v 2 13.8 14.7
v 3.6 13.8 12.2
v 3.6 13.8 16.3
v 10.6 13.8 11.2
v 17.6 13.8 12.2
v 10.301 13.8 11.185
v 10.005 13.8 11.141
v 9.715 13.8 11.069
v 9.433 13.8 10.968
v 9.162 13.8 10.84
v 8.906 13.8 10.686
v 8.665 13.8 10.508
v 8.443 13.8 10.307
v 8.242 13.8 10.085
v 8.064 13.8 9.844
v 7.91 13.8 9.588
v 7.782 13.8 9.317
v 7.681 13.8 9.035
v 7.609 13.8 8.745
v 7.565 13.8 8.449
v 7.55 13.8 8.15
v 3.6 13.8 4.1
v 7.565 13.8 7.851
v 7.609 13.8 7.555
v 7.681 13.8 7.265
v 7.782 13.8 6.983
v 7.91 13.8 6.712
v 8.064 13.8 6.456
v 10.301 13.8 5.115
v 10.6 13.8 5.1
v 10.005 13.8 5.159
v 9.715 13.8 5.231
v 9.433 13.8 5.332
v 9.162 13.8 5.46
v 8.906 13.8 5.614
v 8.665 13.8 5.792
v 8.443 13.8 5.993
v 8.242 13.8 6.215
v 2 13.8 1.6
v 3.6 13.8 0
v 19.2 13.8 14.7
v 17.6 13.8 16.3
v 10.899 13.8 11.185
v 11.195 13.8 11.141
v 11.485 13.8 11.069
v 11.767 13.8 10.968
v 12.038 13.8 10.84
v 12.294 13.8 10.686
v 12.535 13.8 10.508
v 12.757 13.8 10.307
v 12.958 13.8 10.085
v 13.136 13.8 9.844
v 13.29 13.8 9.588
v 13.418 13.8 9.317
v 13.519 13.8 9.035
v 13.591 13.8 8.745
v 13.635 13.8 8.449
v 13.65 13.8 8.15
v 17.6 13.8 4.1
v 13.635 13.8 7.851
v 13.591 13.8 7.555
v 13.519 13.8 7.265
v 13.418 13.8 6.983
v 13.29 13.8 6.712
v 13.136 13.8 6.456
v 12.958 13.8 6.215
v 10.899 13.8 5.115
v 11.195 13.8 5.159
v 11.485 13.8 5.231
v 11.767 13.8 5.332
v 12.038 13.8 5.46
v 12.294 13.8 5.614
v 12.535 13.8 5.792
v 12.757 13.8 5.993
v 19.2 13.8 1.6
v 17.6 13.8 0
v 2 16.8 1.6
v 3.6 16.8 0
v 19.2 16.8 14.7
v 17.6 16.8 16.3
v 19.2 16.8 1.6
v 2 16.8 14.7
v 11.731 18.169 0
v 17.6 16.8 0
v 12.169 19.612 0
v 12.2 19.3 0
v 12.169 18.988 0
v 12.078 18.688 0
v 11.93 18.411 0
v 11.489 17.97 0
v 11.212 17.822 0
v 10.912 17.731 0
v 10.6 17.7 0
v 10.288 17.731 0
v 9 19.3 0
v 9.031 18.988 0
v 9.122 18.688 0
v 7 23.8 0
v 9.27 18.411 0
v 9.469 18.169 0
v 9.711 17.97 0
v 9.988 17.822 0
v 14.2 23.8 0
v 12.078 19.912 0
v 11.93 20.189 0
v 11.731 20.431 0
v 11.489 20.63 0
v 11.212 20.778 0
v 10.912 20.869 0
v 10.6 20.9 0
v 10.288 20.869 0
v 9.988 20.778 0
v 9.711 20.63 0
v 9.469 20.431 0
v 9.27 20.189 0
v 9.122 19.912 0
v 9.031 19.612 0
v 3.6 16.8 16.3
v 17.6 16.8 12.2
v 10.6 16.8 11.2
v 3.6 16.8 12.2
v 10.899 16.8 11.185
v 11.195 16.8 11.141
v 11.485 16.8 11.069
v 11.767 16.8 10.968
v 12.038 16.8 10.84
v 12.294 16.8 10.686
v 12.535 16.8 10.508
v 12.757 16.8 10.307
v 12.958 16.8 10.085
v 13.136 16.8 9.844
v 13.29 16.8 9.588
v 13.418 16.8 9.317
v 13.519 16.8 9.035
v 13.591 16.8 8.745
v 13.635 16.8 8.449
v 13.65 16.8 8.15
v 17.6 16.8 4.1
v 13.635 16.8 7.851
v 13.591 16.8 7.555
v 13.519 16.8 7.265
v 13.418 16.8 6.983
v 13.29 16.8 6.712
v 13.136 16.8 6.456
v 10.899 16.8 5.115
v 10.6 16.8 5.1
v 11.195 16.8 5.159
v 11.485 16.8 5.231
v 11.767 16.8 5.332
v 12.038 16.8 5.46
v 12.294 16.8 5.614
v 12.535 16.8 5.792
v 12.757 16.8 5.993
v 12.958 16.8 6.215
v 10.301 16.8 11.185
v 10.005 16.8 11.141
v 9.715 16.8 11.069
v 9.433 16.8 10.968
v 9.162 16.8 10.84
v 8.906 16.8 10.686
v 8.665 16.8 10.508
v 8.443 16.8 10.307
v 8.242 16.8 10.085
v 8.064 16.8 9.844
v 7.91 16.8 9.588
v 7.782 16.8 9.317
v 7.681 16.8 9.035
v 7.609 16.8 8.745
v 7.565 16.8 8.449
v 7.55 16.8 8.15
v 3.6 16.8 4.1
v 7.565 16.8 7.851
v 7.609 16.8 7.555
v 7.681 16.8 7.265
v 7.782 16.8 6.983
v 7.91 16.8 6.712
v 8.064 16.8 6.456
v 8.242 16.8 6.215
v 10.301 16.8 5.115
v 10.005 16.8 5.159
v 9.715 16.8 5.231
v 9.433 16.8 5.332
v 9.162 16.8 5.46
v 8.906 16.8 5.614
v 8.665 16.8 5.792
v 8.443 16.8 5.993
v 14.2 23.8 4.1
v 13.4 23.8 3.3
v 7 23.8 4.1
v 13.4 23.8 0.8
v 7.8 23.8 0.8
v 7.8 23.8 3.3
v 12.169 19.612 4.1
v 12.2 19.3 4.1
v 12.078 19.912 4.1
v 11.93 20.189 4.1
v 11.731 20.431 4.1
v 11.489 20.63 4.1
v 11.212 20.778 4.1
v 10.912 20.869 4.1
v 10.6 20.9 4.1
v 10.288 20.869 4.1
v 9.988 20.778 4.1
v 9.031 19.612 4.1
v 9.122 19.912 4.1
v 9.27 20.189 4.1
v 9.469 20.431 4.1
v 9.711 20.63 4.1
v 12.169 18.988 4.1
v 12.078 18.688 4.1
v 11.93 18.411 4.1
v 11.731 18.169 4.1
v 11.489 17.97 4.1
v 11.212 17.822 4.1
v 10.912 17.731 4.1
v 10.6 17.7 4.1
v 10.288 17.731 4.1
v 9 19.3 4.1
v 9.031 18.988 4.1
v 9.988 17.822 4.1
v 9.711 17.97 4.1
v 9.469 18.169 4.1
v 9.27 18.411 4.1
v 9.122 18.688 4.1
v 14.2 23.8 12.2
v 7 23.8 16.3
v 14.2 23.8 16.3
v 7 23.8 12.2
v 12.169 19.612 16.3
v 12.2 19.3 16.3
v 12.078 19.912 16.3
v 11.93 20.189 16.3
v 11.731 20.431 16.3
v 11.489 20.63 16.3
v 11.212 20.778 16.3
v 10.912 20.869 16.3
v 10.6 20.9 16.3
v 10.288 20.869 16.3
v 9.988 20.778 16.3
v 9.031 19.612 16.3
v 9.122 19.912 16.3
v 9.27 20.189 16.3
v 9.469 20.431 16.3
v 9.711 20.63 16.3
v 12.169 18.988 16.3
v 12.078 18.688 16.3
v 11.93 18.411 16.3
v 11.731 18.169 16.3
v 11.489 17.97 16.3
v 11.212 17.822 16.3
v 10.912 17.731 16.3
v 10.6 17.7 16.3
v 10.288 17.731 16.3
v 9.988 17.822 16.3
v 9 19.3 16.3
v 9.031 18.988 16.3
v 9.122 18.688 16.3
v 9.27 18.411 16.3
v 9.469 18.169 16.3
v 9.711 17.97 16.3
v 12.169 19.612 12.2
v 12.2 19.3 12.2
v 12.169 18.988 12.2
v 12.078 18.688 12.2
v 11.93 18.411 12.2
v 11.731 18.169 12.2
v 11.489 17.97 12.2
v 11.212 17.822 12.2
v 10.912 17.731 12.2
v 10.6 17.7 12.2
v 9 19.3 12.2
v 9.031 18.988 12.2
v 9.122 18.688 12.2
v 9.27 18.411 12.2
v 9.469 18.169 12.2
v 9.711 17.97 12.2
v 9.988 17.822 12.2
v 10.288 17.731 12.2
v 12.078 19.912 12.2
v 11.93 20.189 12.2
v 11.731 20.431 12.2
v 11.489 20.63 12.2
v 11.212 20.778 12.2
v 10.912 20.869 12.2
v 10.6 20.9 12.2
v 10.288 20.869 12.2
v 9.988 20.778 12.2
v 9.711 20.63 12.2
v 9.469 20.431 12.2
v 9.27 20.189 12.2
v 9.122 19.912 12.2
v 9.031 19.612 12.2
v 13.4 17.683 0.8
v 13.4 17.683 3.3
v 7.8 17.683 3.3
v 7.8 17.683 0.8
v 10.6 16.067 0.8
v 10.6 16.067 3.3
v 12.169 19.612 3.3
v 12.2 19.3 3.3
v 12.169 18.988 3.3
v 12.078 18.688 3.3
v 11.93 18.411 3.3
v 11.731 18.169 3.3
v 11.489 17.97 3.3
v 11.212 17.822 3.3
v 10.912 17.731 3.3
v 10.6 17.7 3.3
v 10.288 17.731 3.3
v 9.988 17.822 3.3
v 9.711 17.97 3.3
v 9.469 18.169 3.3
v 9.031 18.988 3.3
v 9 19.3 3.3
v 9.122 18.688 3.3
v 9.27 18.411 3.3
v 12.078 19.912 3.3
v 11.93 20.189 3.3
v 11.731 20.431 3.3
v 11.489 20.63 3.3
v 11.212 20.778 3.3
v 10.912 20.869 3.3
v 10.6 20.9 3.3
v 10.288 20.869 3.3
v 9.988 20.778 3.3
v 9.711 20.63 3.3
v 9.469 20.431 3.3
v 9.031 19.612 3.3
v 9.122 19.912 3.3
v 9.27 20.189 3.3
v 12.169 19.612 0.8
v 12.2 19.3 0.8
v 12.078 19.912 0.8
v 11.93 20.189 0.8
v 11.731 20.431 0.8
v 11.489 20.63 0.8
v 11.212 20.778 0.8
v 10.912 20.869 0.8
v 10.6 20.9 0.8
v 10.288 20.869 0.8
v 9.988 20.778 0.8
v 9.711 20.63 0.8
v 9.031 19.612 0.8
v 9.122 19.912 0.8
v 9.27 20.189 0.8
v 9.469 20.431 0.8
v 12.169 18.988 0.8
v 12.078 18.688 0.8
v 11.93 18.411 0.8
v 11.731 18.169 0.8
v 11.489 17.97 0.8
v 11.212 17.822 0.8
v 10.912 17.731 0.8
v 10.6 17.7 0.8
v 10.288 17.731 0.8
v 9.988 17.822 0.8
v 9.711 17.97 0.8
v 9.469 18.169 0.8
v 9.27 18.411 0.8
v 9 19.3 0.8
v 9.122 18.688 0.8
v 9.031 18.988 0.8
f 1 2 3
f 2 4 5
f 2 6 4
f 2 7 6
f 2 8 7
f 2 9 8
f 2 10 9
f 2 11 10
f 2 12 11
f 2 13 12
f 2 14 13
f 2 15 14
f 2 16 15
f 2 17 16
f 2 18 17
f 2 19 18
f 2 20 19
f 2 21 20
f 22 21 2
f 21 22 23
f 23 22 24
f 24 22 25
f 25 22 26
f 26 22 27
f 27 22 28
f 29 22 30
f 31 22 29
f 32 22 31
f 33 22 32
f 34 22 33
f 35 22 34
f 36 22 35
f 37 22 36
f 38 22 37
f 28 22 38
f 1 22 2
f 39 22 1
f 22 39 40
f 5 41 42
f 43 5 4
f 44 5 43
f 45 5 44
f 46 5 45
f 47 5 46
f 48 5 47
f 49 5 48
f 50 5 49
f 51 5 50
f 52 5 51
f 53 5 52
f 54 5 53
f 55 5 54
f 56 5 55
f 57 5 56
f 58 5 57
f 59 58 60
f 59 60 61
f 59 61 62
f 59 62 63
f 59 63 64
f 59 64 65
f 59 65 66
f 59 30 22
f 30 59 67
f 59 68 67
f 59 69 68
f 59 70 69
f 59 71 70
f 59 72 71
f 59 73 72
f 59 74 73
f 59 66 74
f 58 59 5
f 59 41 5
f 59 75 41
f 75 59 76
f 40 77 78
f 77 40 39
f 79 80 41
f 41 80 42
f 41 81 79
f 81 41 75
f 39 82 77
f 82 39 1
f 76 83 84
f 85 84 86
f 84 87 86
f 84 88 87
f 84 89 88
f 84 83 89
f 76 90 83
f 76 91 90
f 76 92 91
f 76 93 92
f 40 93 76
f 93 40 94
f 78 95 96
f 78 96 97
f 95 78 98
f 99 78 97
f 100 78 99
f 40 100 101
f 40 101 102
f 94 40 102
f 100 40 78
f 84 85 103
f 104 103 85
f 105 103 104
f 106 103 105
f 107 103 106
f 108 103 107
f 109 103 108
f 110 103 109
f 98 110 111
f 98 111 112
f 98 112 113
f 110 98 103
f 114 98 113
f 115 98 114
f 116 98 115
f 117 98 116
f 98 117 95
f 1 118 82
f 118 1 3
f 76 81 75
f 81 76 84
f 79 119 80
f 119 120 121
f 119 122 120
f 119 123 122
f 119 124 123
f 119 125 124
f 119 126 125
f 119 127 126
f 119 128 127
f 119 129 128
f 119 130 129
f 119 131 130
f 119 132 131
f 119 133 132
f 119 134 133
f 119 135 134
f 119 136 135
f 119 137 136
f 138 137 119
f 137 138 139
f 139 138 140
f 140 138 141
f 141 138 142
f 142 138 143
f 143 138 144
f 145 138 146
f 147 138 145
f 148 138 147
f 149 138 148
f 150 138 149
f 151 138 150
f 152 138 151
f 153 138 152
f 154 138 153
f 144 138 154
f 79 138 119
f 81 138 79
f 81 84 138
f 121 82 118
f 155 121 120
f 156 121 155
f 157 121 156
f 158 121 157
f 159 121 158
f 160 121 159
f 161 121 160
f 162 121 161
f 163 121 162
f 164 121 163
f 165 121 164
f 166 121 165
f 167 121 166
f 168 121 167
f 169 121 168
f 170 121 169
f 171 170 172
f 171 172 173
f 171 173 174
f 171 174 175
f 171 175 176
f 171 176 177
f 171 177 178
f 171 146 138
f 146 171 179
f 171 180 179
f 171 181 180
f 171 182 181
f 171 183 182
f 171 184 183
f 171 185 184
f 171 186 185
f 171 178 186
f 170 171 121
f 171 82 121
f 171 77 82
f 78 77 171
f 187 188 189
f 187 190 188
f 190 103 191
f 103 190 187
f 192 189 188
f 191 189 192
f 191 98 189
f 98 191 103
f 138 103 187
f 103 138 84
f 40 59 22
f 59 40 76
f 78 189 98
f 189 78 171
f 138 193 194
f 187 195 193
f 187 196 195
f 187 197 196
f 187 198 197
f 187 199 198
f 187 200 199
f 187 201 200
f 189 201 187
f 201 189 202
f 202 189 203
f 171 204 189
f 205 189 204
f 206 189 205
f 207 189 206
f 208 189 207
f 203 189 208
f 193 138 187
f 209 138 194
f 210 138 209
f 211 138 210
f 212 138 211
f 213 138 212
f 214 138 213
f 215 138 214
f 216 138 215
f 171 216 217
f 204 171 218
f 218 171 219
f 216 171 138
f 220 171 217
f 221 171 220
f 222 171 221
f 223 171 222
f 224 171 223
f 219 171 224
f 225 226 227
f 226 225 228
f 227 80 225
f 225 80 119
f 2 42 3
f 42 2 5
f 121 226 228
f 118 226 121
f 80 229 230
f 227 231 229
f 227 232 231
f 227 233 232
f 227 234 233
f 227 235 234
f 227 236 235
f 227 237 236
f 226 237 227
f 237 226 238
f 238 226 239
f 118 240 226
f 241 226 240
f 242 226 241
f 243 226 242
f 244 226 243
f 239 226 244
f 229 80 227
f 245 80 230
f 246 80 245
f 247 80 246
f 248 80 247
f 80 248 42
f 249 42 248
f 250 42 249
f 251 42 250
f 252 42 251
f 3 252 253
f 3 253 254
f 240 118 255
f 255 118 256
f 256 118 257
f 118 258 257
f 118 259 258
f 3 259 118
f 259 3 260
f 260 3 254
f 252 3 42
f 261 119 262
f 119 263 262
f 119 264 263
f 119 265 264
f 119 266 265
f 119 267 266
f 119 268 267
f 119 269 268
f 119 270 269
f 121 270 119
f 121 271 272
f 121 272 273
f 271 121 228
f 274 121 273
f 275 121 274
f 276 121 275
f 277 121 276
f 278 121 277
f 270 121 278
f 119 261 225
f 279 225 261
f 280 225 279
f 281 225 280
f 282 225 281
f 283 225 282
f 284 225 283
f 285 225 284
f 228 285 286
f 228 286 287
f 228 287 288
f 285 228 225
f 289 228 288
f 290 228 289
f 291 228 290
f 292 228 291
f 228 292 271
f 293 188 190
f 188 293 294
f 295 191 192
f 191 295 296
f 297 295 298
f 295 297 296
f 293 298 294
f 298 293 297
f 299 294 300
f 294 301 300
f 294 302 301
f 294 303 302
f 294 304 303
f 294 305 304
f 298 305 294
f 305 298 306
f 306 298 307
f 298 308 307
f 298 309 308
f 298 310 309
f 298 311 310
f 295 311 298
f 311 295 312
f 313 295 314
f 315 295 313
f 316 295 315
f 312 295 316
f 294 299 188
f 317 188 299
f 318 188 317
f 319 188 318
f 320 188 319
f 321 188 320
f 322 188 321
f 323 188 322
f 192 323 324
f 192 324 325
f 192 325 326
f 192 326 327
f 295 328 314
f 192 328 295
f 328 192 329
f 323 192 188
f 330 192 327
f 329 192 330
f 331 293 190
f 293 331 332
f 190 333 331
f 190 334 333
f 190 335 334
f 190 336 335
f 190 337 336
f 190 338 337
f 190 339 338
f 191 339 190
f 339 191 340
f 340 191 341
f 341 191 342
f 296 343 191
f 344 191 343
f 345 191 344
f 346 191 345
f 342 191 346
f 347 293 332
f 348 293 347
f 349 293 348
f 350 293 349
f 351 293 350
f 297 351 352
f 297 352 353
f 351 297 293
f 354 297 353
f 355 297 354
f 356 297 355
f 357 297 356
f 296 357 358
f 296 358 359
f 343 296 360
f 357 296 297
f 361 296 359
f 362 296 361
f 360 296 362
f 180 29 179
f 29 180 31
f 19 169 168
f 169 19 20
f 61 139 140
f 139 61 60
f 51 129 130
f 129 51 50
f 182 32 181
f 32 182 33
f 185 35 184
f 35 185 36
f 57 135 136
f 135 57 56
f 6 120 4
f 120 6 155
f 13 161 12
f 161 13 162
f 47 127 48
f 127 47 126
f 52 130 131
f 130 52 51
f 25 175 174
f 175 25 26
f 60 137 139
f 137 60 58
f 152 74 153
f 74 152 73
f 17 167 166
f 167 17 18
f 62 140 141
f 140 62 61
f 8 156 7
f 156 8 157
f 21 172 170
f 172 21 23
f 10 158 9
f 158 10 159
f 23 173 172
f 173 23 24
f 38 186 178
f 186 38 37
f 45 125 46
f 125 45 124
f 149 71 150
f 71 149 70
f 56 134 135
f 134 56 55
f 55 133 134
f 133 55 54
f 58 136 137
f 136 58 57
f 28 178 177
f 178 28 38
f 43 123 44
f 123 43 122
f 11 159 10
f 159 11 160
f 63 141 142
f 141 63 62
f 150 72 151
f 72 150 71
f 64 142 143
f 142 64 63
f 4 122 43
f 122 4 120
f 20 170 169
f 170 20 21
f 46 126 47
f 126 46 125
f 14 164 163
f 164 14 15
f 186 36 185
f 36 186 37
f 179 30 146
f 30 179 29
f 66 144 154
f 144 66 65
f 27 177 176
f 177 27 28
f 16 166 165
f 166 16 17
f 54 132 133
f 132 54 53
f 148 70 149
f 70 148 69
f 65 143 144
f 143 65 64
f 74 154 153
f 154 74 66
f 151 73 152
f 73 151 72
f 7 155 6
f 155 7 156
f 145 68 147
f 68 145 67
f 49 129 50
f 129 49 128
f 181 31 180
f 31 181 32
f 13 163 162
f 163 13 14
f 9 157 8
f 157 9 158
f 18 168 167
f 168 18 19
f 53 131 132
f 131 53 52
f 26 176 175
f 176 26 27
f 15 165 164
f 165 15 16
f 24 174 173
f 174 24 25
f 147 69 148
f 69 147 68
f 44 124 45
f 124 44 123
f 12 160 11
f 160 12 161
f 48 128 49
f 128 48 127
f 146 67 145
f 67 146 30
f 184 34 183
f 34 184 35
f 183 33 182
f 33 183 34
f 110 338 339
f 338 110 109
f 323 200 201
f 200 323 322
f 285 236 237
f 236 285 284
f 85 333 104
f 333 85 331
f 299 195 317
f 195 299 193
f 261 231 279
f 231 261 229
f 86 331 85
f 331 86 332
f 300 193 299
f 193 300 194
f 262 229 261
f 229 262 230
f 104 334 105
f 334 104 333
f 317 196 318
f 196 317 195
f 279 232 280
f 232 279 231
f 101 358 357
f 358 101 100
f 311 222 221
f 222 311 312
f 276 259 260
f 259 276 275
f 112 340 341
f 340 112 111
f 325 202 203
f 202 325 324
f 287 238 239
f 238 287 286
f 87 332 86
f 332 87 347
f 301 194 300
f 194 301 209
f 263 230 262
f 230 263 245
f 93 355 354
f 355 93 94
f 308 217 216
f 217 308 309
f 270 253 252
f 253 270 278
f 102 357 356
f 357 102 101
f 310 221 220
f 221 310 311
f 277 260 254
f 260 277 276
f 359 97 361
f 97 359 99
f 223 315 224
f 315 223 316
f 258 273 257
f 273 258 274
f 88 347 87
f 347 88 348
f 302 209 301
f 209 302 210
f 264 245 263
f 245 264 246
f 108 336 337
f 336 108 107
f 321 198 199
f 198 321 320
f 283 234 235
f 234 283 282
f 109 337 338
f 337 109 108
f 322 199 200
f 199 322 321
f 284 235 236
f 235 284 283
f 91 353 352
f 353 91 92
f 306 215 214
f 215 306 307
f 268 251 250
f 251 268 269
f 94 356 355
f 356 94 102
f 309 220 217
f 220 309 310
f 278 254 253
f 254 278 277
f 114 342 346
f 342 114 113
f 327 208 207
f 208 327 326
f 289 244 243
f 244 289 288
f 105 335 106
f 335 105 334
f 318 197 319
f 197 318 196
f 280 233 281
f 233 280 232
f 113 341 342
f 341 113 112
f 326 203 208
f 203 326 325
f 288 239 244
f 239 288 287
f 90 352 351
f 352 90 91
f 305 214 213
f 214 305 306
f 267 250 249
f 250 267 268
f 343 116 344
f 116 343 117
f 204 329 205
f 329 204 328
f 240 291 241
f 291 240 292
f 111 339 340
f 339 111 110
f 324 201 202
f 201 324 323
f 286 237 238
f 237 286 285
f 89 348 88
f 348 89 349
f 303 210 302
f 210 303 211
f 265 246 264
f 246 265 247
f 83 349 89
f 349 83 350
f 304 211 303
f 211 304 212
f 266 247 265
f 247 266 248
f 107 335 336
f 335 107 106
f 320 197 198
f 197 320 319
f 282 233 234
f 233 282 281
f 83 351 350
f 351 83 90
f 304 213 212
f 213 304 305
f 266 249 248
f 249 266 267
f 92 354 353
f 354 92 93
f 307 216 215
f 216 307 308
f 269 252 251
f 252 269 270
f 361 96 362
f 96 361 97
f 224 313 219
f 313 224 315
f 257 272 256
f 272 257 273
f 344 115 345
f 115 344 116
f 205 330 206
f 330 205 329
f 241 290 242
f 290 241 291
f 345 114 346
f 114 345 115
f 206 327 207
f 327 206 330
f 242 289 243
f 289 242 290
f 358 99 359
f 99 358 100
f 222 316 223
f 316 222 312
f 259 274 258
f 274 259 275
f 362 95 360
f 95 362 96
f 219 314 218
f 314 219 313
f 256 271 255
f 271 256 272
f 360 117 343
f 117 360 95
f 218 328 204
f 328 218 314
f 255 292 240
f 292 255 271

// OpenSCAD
// file: ../lib/shapes.scad
// lib/shapes.scad — geometry helpers shared by every part. `use` it: it defines no variables.
// $fn is dynamically scoped, so round things here take the caller's $fn: set `$fn = fn_round;`
// at the top of a part file (after the include) and pass `$fn = fn_small` on small features.

// 2D rectangle `size` = [w, h] with its four corners cut at 45° by c.
// Corner at the origin unless center=true.
module chamfered_rect(size, c, center=false) {
    translate(center ? [-size.x/2, -size.y/2] : [0, 0])
        polygon([[c, 0], [size.x - c, 0], [size.x, c], [size.x, size.y - c],
                 [size.x - c, size.y], [c, size.y], [0, size.y - c], [0, c]]);
}

// 2D rectangle `size` = [w, h] with its four corners rounded by r.
// Corner at the origin unless center=true.
module rounded_rect(size, r, center=false) {
    translate(center ? [0, 0] : [size.x/2, size.y/2])
        offset(r=r) square([size.x - 2*r, size.y - 2*r], center=true);
}

// Box `size` = [x, y, z] with all twelve edges chamfered at 45° by c: the hull of three boxes,
// each shrunk by c along two of its axes, is exactly that.
// Corner at the origin unless center=true.
module chamfered_box(size, c, center=false) {
    translate(center ? -size/2 : [0, 0, 0]) hull() {
        translate([c, c, 0]) cube([size.x - 2*c, size.y - 2*c, size.z]);
        translate([c, 0, c]) cube([size.x - 2*c, size.y, size.z - 2*c]);
        translate([0, c, c]) cube([size.x, size.y - 2*c, size.z - 2*c]);
    }
}

// Hexagonal prism (nut, nut trap): across-flats af, height h along +Z from z=0
// (center=true: centred on z=0). Corners on ±X, flats at y = ±af/2.
module hex(af, h, center=false) {
    cylinder(d=af/cos(30), h=h, center=center, $fn=6);
}

// Torus about Z: centreline radius R, tube radius r, tube centre in the plane z=0.
// The ring takes the caller's $fn; fn_tube (default: the same) sets the tube's.
module torus(R, r, fn_tube) {
    rotate_extrude() translate([R, 0]) circle(r=r, $fn=is_undef(fn_tube) ? $fn : fn_tube);
}

// 2D right triangle: right angle at the origin, leg a along +X, leg b along +Y (b defaults
// to a: a 45° chamfer or gusset). Mirror/rotate it into place, then linear_extrude.
module right_triangle(a, b) {
    polygon([[0, 0], [a, 0], [0, is_undef(b) ? a : b]]);
}

// Section helpers for renders: keep only the part of the children whose coordinate along
// axis ("x" | "y" | "z") is below (keep_below) or above (keep_above) `at`.
// `big` must exceed the model's extent in every direction.
module keep_below(axis, at, big=1000) {
    difference() { children(); translate(_axis_vec(axis)*(at + big)) cube(2*big, center=true); }
}
module keep_above(axis, at, big=1000) {
    difference() { children(); translate(_axis_vec(axis)*(at - big)) cube(2*big, center=true); }
}
function _axis_vec(axis) = axis == "x" ? [1, 0, 0] : axis == "y" ? [0, 1, 0] : [0, 0, 1];
// main file
// parts/cart.scad — the magnet carrier that rides on the lid top [v2 Body009].
//
// A floor `mag_h` thick on the lid top with the magnet press-fitted through it, and two
// trapezoid ears carrying the M3 lead screw at screw_y. The cart is `cart_w` wide (the lid's
// lip lines minus one extrusion each side) and `cart_len` long: two ears plus the magnet hole
// plus `mag_margin` of floor each side of it. The front ear (−Z, toward the servo) traps the
// drive nut in a top-loading slot: v2's hex pocket through the ear held the nut only until
// the rod pushed the cart, so here the slot is closed on the +Z side and open only upward.

include <../params.scad>
use <../lib/shapes.scad>
$fn = fn_round;
eps = 0.01;

cart_x0 = W/2 - cart_w/2;  cart_x1 = W/2 + cart_w/2;   // floor edges [v2 2 .. 19.2]
cart_floor_top = top_y + mag_h;                          // the ears root here
cart_chamfer = 4*line_w;                                 // floor corner chamfers [v2 1.6]: the corners never catch the lid edge
cart_ear_base = [cart_x0 + ear_base_inset, cart_x1 - ear_base_inset];   // ear footprint on the floor
cart_slot_w = nut_af + nut_clear;                        // slot across the flats, flats vertical
cart_slot_t = nut_t + nut_clear;                         // slot along the rod, centred in the ear

// One ear: trapezoid in (x, y) rooted `mag_h` deep in the floor (so the union has no coplanar
// seam), `ear_t` along +Z from z=0.
module cart_ear() {
    linear_extrude(ear_t)
        polygon([[cart_ear_base[0], top_y], [cart_ear_base[1], top_y],
                 [cart_ear_base[1], cart_floor_top], [W/2 + ear_top_w/2, cart_top],
                 [W/2 - ear_top_w/2, cart_top], [cart_ear_base[0], cart_floor_top]]);
}

// The nut trap in the front ear: a hex prism (corners up and down, flats vertical) around the
// rod axis plus a slot of the same width from the axis up through the ear top. The nut drops
// in from above; the lower half of the hexagon is its floor, the flats stop it turning, the
// ear's two walls stop it moving along the rod.
module cart_nut_slot() {
    translate([W/2, screw_y, ear_t/2 - cart_slot_t/2]) {
        rotate([0, 0, 90]) hex(cart_slot_w, cart_slot_t);   // hex() has corners on ±X: turned so the flats are vertical
        translate([-cart_slot_w/2, 0, 0]) cube([cart_slot_w, cart_top - screw_y + eps, cart_slot_t]);
    }
}

// The asserts live inside the module, not at file top level: `use <cart.scad>` (assembly.scad)
// imports modules, functions and variables but does not execute top-level statements, so a
// file-top assert would be silent in the assembly and only fire on a standalone render.
module cart() {
    assert(ear_base_inset >= cart_chamfer - num_tol, "cart: ear base overhangs the floor's corner chamfer: raise ear_base_inset");
    assert(cart_ear_base[0] <= W/2 - ear_top_w/2 + num_tol, "cart: ear top wider than its base");
    assert(mag_d + mag_clear + 2*cart_chamfer <= cart_w + num_tol, "cart: magnet hole reaches the floor's side chamfers");
    assert(screw_y + screw_hole_d/2 < cart_top - num_tol, "cart: rod hole breaks out of the ear top: raise ear_h");
    difference() {
        union() {
            // floor: chamfered rectangle in (x, z), mag_h tall along +Y from the lid top.
            // rotate([90,0,0]) maps the extrusion w onto −y, so it runs from −mag_h to 0 first.
            translate([0, top_y, 0]) rotate([90, 0, 0]) translate([0, 0, -mag_h]) linear_extrude(mag_h)
                translate([cart_x0, 0]) chamfered_rect([cart_w, cart_len], cart_chamfer);
            cart_ear();
            translate([0, 0, cart_len - ear_t]) cart_ear();
        }
        // magnet, press fit through the floor
        translate([W/2, top_y - eps, cart_len/2]) rotate([-90, 0, 0]) cylinder(d=mag_d + mag_clear, h=mag_h + 2*eps);
        // lead screw through both ears
        translate([W/2, screw_y, -eps]) cylinder(d=screw_hole_d, h=cart_len + 2*eps, $fn=fn_small);
        cart_nut_slot();
    }
}

// Print: floor bottom (y = top_y) on the bed; ears up, nut slot open upward.
// rotate([90,0,0]) maps (x, y, z) onto (x, −z, y).
module cart_print() { rotate([90, 0, 0]) translate([0, -top_y, 0]) cart(); }

function cart_size() = [cart_w, mag_h + ear_h, cart_len];

for_print = false;
if (is_undef(ASSEMBLY)) {
    echo(cart_size=cart_size(), cart_x0=cart_x0, cart_floor_top=cart_floor_top, cart_ear_base=cart_ear_base,
         cart_slot_w=cart_slot_w, cart_slot_t=cart_slot_t, nut_floor_y=screw_y - nut_ac/2, floor_left_under_nut=screw_y - nut_ac/2 - top_y);
    if (for_print) cart_print(); else cart();
}
